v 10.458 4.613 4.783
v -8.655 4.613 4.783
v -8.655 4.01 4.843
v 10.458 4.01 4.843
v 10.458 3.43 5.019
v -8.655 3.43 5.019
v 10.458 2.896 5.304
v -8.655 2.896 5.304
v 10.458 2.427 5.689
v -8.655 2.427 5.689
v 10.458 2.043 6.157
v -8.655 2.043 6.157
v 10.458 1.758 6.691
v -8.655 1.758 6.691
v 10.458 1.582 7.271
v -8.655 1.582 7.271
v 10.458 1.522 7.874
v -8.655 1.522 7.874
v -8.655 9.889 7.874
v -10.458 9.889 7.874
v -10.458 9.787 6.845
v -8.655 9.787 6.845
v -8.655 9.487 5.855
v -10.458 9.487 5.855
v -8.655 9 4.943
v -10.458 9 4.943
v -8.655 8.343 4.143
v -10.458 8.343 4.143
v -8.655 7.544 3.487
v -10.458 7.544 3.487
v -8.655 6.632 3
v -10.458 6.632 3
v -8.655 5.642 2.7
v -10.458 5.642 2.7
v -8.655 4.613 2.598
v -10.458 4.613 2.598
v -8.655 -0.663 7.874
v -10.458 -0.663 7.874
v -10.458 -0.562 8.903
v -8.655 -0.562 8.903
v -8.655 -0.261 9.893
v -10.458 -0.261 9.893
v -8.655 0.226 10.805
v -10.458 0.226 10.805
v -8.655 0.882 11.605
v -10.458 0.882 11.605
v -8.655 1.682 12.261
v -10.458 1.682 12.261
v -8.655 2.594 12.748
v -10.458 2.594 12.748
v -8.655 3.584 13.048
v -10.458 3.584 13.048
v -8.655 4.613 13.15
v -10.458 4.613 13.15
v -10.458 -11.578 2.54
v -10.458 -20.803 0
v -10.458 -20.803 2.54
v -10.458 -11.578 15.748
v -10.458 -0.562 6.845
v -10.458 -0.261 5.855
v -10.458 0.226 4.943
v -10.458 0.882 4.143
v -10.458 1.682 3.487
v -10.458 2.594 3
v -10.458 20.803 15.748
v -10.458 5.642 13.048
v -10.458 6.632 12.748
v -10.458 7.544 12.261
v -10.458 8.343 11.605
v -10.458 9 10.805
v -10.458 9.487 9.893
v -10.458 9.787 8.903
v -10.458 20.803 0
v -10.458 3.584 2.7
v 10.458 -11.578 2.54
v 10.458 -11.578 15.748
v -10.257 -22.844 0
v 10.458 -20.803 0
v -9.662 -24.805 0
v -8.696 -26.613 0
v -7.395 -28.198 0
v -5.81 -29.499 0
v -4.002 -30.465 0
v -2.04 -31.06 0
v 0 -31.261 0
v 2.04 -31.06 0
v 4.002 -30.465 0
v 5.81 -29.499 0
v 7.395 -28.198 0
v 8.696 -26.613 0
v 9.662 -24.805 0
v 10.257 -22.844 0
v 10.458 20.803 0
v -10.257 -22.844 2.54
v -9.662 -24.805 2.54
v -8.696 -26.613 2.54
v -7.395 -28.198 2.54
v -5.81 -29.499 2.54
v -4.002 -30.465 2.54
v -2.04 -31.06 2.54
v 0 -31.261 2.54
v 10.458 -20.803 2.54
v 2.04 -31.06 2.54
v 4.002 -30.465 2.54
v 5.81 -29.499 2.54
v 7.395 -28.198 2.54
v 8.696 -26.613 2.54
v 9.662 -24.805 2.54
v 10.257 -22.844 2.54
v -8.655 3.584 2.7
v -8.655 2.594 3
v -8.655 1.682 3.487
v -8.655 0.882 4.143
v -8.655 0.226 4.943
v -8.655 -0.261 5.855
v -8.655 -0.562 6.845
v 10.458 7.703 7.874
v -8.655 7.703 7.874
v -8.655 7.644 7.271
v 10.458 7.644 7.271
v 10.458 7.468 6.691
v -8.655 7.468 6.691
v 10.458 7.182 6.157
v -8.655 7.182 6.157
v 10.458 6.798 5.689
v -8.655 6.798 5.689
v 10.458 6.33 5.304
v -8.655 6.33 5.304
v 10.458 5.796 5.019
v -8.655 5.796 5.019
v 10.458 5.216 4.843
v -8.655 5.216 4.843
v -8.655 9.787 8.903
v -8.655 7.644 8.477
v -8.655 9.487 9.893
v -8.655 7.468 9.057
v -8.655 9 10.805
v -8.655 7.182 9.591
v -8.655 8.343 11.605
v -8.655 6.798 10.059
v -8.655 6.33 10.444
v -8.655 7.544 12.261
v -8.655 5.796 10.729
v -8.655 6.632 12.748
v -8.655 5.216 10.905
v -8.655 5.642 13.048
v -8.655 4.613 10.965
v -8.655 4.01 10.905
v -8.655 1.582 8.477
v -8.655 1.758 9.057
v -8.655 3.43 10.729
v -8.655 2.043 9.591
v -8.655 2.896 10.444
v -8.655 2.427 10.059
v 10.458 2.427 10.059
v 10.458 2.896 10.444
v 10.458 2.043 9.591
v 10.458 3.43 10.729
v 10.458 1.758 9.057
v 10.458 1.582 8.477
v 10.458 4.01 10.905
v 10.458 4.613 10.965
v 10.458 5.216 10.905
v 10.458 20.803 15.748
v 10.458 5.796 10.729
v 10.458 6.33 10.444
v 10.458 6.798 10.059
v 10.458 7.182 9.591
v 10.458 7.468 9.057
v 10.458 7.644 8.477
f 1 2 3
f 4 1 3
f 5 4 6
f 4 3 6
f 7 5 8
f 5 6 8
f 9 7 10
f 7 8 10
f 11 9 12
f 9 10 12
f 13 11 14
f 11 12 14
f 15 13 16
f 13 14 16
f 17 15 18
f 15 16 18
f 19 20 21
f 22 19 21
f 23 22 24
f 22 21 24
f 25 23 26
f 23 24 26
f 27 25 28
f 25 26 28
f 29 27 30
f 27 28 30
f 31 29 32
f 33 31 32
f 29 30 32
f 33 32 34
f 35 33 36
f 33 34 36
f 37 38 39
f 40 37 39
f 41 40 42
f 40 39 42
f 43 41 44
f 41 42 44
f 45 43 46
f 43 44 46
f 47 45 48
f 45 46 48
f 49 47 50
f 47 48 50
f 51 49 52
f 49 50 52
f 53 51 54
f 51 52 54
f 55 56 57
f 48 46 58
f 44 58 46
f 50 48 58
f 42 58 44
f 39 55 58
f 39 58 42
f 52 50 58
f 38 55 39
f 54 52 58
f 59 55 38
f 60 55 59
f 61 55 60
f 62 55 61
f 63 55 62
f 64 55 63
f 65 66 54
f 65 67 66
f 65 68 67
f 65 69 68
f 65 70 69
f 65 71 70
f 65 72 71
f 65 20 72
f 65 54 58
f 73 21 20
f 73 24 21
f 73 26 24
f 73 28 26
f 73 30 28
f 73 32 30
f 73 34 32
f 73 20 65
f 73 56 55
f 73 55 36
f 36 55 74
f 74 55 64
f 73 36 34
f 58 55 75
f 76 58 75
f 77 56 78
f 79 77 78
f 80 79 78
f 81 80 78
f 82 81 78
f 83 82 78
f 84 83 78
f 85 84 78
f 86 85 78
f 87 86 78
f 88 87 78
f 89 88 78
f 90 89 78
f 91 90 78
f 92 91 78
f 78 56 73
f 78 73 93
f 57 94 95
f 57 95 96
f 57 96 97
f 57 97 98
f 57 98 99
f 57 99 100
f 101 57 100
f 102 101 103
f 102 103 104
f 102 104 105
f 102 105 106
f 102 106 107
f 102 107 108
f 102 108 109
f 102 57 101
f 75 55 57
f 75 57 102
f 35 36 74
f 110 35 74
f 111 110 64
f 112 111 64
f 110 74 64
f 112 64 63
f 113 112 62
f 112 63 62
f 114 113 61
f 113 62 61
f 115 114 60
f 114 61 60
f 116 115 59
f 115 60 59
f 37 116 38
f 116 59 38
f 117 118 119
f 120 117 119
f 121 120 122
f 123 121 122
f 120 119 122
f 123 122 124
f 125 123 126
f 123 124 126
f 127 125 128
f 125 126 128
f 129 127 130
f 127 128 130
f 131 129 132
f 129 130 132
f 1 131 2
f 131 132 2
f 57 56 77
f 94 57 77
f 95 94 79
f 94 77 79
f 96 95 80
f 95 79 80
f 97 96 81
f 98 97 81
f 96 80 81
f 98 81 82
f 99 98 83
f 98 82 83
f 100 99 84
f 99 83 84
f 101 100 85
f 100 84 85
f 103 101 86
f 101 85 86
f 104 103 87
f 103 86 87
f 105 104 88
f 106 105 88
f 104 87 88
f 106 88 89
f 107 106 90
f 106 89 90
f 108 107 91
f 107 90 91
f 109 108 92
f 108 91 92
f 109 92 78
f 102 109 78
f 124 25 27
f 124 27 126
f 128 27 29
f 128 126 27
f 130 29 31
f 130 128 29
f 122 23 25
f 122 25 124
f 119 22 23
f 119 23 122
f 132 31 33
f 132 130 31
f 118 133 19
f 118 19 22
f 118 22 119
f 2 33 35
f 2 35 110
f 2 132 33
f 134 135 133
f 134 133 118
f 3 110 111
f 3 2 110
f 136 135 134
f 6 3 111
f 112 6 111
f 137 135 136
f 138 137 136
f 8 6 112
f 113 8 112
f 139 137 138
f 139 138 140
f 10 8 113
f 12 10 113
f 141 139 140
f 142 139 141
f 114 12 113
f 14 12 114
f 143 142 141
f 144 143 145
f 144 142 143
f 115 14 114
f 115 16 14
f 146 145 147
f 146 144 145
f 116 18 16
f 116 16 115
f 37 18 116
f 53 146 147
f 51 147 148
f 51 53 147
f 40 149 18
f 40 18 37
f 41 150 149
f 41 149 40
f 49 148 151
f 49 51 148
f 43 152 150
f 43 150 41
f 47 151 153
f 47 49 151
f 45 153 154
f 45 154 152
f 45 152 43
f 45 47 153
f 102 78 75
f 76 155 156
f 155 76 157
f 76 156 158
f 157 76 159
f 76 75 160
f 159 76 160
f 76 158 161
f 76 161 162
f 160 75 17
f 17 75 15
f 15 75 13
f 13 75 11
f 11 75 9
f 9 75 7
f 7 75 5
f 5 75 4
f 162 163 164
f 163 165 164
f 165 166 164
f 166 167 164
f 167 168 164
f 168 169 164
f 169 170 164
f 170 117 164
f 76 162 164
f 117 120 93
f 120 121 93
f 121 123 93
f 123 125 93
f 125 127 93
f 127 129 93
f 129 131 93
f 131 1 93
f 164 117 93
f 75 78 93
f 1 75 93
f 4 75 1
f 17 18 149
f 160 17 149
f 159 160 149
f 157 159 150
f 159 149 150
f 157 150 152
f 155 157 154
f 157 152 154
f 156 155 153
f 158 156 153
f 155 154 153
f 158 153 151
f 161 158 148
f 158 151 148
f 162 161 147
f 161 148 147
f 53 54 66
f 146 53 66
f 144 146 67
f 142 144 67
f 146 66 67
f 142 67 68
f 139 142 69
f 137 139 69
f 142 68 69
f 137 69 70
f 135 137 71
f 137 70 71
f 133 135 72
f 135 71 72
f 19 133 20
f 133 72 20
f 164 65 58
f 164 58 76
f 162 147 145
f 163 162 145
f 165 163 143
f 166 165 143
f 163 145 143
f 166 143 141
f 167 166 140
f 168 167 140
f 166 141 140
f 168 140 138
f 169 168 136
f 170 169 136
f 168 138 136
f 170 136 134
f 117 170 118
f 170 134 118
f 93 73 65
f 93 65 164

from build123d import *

# Parameters (mm, degrees)
F0_W     = 20.9161378443
F0_H     = 9.225605987
F1_DEPTH = 2.54
F0_H_2   = 32.3809729889
F2_DEPTH = 15.748
F4_DEPTH = 25.4
F5_DEPTH = 1.8034


with BuildPart() as f1:
    # F0 (on Top) → F1 (new body)
    with BuildSketch(Plane.XY):
        with BuildLine():
            ThreePointArc((-10.4580689222, -20.803289488), (0, -31.2613584101), (10.4580689222, -20.803289488))
            Line((10.4580689222, -20.803289488), (-10.4580689222, -20.803289488))
        make_face()
        with Locations((0, -16.1904864945)):
            Rectangle(F0_W, F0_H)
    extrude(amount=F1_DEPTH)

    # F0 (on Top) → F2 (join)
    with BuildSketch(Plane.XY):
        with Locations((0, 4.6128029935)):
            Rectangle(F0_W, F0_H_2)
    extrude(amount=F2_DEPTH)

    # F3 (on face) → F4 (cut)
    with BuildSketch(Plane(origin=(-10.4580689222, 0, 0), x_dir=(0, -1, 0), z_dir=(-1, 0, 0))):
        with BuildLine():
            Line((-4.6128029935, 4.7834570753), (-4.6128029935, 7.874))
            Line((-4.6128029935, 7.874), (-7.7033459182, 7.874))
            ThreePointArc((-7.7033459182, 7.874), (-6.7981468531, 5.6886561404), (-4.6128029935, 4.7834570753))
        make_face()
        with BuildLine():
            Line((-1.5222600688, 7.874), (-4.6128029935, 7.874))
            Line((-4.6128029935, 7.874), (-4.6128029935, 4.7834570753))
            ThreePointArc((-4.6128029935, 4.7834570753), (-2.4274591339, 5.6886561404), (-1.5222600688, 7.874))
        make_face()
        with BuildLine():
            ThreePointArc((-1.5222600688, 7.874), (-2.4274591339, 10.0593438596), (-4.6128029935, 10.9645429247))
            Line((-4.6128029935, 10.9645429247), (-4.6128029935, 7.874))
            Line((-4.6128029935, 7.874), (-1.5222600688, 7.874))
        make_face()
        with BuildLine():
            Line((-4.6128029935, 7.874), (-4.6128029935, 10.9645429247))
            ThreePointArc((-4.6128029935, 10.9645429247), (-6.7981468531, 10.0593438596), (-7.7033459182, 7.874))
            Line((-7.7033459182, 7.874), (-4.6128029935, 7.874))
        make_face()
    extrude(amount=-F4_DEPTH, mode=Mode.SUBTRACT)

    # F3 (on face) → F5 (cut)
    with BuildSketch(Plane(origin=(-10.4580689222, 0, 0), x_dir=(0, -1, 0), z_dir=(-1, 0, 0))):
        with BuildLine():
            Line((-4.6128029935, 10.9645429247), (-4.6128029935, 13.1498547085))
            ThreePointArc((-4.6128029935, 13.1498547085), (-8.3433956344, 11.6045926409), (-9.888657702, 7.874))
            Line((-9.888657702, 7.874), (-7.7033459182, 7.874))
            ThreePointArc((-7.7033459182, 7.874), (-6.7981468531, 10.0593438596), (-4.6128029935, 10.9645429247))
        make_face()
        with BuildLine():
            ThreePointArc((0.663051715, 7.874), (-0.8822103526, 11.6045926409), (-4.6128029935, 13.1498547085))
            Line((-4.6128029935, 13.1498547085), (-4.6128029935, 10.9645429247))
            ThreePointArc((-4.6128029935, 10.9645429247), (-2.4274591339, 10.0593438596), (-1.5222600688, 7.874))
            Line((-1.5222600688, 7.874), (0.663051715, 7.874))
        make_face()
        with BuildLine():
            ThreePointArc((-4.6128029935, 2.5981452915), (-0.8822103526, 4.1434073591), (0.663051715, 7.874))
            Line((0.663051715, 7.874), (-1.5222600688, 7.874))
            ThreePointArc((-1.5222600688, 7.874), (-2.4274591339, 5.6886561404), (-4.6128029935, 4.7834570753))
            Line((-4.6128029935, 4.7834570753), (-4.6128029935, 2.5981452915))
        make_face()
        with BuildLine():
            Line((-7.7033459182, 7.874), (-9.888657702, 7.874))
            ThreePointArc((-9.888657702, 7.874), (-8.3433956344, 4.1434073591), (-4.6128029935, 2.5981452915))
            Line((-4.6128029935, 2.5981452915), (-4.6128029935, 4.7834570753))
            ThreePointArc((-4.6128029935, 4.7834570753), (-6.7981468531, 5.6886561404), (-7.7033459182, 7.874))
        make_face()
    extrude(amount=-F5_DEPTH, mode=Mode.SUBTRACT)


solid = f1.part
